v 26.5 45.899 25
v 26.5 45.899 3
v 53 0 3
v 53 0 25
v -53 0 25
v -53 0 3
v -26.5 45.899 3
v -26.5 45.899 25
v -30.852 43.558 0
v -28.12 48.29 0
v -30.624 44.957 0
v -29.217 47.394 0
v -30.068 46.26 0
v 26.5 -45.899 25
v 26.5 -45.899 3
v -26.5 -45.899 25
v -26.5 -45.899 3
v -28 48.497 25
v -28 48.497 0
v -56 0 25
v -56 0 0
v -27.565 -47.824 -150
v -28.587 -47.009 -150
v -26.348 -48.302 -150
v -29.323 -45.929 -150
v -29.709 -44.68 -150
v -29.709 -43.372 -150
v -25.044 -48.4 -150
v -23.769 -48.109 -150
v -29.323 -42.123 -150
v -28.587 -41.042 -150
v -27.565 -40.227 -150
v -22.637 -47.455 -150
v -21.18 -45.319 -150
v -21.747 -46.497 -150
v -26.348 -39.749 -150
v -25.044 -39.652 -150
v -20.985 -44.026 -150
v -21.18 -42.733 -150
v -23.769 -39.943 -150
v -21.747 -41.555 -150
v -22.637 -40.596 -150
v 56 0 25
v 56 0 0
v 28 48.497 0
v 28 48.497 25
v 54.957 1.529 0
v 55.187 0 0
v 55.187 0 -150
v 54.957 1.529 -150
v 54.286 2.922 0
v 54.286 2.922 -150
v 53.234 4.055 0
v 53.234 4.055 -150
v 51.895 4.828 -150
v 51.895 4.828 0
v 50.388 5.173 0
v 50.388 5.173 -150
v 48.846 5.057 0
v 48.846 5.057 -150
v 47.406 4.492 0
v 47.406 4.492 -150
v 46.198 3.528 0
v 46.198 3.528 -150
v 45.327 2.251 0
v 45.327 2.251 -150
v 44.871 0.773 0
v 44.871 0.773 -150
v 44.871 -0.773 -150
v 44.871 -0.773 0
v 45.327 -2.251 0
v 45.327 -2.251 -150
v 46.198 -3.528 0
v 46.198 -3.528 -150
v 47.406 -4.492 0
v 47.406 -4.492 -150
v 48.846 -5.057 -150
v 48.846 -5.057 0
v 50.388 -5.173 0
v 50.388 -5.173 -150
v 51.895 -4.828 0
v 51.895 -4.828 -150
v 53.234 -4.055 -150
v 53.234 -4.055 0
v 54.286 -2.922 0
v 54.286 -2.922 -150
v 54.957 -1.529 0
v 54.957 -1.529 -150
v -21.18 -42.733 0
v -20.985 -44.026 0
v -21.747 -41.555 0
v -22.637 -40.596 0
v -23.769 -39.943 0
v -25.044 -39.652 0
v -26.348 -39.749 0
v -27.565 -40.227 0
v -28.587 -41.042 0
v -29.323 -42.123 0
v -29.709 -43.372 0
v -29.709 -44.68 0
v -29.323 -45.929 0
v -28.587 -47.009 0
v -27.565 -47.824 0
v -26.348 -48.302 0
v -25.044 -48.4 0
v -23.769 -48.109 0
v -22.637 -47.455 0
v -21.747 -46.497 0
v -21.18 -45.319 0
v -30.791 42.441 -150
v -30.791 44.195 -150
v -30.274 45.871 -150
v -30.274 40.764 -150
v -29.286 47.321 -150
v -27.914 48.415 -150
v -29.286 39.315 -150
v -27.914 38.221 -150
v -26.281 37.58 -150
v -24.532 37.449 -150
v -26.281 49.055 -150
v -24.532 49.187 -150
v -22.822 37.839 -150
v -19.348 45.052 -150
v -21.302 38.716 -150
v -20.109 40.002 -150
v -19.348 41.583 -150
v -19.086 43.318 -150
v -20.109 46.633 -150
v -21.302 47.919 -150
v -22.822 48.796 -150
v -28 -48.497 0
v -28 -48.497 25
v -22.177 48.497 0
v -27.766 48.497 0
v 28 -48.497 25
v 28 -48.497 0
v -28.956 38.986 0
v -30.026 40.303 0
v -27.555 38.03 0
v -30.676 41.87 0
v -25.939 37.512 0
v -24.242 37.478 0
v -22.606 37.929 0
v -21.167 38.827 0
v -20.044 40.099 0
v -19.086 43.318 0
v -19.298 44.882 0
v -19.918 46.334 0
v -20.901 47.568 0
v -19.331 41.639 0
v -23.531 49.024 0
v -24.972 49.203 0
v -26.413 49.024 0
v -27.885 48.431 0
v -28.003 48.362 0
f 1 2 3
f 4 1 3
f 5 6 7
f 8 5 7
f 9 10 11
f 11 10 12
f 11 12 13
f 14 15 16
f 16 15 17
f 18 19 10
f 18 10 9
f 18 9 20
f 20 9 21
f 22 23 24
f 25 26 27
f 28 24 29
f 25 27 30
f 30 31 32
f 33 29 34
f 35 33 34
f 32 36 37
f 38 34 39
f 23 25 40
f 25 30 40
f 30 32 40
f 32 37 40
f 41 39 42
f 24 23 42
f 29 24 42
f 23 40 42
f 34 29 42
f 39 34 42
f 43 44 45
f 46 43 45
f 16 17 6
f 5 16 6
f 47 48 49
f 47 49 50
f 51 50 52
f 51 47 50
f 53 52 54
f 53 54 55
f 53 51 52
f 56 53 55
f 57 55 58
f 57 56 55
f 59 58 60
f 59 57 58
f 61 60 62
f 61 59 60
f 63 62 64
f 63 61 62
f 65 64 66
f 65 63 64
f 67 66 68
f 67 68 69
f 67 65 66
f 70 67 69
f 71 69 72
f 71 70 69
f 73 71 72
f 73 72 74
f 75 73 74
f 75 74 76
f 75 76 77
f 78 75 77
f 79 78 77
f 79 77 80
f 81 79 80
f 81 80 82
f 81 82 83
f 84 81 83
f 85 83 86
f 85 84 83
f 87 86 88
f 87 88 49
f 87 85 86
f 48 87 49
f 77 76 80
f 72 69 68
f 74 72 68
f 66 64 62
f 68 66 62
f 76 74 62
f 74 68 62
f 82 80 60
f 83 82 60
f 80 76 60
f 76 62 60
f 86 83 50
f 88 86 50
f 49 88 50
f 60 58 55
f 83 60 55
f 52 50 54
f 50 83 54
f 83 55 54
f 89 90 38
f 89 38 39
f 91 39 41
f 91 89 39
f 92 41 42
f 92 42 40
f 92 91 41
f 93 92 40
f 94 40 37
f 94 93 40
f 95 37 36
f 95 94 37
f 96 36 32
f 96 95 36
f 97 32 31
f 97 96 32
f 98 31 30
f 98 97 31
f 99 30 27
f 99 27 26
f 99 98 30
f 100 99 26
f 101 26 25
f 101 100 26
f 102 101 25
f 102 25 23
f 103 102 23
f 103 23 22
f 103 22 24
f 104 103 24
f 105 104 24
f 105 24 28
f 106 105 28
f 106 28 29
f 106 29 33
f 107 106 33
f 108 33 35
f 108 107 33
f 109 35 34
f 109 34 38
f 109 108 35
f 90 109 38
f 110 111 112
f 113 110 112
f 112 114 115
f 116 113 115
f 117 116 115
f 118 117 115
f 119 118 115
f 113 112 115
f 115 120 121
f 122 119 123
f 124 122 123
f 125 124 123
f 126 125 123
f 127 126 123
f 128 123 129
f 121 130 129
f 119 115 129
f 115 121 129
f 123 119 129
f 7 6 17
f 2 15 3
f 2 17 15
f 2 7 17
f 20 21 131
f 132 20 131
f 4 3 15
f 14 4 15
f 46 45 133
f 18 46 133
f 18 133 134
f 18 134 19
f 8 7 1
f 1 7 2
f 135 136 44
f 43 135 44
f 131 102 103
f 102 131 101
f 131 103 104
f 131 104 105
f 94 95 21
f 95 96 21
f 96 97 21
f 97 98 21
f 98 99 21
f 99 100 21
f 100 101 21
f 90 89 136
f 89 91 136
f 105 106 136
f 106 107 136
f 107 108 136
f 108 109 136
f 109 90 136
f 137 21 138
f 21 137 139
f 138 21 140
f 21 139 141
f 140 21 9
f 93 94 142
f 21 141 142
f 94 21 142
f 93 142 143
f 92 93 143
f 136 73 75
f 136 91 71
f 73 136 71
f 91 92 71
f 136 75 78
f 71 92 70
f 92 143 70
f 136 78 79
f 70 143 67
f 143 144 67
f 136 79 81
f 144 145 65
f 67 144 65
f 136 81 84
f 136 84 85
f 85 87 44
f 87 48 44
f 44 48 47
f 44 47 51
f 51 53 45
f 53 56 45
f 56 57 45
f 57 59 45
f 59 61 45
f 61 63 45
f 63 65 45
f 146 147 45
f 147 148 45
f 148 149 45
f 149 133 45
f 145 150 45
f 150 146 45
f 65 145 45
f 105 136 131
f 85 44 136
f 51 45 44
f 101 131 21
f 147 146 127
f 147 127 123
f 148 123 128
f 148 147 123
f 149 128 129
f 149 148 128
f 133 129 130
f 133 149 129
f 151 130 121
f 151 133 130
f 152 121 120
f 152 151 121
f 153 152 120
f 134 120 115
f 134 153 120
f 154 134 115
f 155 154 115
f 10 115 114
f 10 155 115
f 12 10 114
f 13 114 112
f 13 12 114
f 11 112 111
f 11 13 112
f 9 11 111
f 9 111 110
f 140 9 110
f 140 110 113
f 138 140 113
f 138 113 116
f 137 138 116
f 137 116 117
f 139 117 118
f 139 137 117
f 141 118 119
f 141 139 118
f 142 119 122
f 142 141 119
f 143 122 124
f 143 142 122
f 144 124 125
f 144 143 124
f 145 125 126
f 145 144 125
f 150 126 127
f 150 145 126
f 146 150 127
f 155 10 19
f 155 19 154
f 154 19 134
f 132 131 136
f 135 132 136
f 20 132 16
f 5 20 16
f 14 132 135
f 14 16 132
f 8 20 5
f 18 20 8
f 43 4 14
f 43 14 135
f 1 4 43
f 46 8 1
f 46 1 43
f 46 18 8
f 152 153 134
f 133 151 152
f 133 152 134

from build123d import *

# Parameters (mm, degrees)
F1_DEPTH = 25
F2_DEPTH = 3
F3_R     = 4.38636
F4_DEPTH = 150
F3_R_2   = 5.18705
F5_DEPTH = 150
F3_R_3   = 5.885261
F6_DEPTH = 150


with BuildPart() as f1:
    # F0 (on Top) → F1 (new body)
    with BuildSketch(Plane.XY):
        Polygon((28, -48.497423), (56, 0), (28, 48.497423), (-28, 48.497423), (-56, 0), (-28, -48.497423), align=None)
        Polygon((26.5, 45.899346), (53, 0), (26.5, -45.899346), (-26.5, -45.899346), (-53, 0), (-26.5, 45.899346), align=None, mode=Mode.SUBTRACT)
    extrude(amount=F1_DEPTH)

    # F0 (on Top) → F2 (join)
    with BuildSketch(Plane.XY):
        Polygon((26.5, -45.899346), (53, 0), (26.5, 45.899346), (-26.5, 45.899346), (-53, 0), (-26.5, -45.899346), align=None)
    extrude(amount=F2_DEPTH)

    # F3 (on Top) → F4 (join)
    with BuildSketch(Plane.XY):
        with Locations((-25.37145, -44.025768)):
            Circle(F3_R)
    extrude(amount=-F4_DEPTH)

    # F3 (on Top) → F5 (join)
    with BuildSketch(Plane.XY):
        with Locations((50, 0)):
            Circle(F3_R_2)
    extrude(amount=-F5_DEPTH)

    # F3 (on Top) → F6 (join)
    with BuildSketch(Plane.XY):
        with Locations((-25.37145, -44.025768)):
            Circle(F3_R)
        with Locations((50, 0)):
            Circle(F3_R_2)
        with Locations((-24.971633, 43.317751)):
            Circle(F3_R_3)
    extrude(amount=-F6_DEPTH)


solid = f1.part
